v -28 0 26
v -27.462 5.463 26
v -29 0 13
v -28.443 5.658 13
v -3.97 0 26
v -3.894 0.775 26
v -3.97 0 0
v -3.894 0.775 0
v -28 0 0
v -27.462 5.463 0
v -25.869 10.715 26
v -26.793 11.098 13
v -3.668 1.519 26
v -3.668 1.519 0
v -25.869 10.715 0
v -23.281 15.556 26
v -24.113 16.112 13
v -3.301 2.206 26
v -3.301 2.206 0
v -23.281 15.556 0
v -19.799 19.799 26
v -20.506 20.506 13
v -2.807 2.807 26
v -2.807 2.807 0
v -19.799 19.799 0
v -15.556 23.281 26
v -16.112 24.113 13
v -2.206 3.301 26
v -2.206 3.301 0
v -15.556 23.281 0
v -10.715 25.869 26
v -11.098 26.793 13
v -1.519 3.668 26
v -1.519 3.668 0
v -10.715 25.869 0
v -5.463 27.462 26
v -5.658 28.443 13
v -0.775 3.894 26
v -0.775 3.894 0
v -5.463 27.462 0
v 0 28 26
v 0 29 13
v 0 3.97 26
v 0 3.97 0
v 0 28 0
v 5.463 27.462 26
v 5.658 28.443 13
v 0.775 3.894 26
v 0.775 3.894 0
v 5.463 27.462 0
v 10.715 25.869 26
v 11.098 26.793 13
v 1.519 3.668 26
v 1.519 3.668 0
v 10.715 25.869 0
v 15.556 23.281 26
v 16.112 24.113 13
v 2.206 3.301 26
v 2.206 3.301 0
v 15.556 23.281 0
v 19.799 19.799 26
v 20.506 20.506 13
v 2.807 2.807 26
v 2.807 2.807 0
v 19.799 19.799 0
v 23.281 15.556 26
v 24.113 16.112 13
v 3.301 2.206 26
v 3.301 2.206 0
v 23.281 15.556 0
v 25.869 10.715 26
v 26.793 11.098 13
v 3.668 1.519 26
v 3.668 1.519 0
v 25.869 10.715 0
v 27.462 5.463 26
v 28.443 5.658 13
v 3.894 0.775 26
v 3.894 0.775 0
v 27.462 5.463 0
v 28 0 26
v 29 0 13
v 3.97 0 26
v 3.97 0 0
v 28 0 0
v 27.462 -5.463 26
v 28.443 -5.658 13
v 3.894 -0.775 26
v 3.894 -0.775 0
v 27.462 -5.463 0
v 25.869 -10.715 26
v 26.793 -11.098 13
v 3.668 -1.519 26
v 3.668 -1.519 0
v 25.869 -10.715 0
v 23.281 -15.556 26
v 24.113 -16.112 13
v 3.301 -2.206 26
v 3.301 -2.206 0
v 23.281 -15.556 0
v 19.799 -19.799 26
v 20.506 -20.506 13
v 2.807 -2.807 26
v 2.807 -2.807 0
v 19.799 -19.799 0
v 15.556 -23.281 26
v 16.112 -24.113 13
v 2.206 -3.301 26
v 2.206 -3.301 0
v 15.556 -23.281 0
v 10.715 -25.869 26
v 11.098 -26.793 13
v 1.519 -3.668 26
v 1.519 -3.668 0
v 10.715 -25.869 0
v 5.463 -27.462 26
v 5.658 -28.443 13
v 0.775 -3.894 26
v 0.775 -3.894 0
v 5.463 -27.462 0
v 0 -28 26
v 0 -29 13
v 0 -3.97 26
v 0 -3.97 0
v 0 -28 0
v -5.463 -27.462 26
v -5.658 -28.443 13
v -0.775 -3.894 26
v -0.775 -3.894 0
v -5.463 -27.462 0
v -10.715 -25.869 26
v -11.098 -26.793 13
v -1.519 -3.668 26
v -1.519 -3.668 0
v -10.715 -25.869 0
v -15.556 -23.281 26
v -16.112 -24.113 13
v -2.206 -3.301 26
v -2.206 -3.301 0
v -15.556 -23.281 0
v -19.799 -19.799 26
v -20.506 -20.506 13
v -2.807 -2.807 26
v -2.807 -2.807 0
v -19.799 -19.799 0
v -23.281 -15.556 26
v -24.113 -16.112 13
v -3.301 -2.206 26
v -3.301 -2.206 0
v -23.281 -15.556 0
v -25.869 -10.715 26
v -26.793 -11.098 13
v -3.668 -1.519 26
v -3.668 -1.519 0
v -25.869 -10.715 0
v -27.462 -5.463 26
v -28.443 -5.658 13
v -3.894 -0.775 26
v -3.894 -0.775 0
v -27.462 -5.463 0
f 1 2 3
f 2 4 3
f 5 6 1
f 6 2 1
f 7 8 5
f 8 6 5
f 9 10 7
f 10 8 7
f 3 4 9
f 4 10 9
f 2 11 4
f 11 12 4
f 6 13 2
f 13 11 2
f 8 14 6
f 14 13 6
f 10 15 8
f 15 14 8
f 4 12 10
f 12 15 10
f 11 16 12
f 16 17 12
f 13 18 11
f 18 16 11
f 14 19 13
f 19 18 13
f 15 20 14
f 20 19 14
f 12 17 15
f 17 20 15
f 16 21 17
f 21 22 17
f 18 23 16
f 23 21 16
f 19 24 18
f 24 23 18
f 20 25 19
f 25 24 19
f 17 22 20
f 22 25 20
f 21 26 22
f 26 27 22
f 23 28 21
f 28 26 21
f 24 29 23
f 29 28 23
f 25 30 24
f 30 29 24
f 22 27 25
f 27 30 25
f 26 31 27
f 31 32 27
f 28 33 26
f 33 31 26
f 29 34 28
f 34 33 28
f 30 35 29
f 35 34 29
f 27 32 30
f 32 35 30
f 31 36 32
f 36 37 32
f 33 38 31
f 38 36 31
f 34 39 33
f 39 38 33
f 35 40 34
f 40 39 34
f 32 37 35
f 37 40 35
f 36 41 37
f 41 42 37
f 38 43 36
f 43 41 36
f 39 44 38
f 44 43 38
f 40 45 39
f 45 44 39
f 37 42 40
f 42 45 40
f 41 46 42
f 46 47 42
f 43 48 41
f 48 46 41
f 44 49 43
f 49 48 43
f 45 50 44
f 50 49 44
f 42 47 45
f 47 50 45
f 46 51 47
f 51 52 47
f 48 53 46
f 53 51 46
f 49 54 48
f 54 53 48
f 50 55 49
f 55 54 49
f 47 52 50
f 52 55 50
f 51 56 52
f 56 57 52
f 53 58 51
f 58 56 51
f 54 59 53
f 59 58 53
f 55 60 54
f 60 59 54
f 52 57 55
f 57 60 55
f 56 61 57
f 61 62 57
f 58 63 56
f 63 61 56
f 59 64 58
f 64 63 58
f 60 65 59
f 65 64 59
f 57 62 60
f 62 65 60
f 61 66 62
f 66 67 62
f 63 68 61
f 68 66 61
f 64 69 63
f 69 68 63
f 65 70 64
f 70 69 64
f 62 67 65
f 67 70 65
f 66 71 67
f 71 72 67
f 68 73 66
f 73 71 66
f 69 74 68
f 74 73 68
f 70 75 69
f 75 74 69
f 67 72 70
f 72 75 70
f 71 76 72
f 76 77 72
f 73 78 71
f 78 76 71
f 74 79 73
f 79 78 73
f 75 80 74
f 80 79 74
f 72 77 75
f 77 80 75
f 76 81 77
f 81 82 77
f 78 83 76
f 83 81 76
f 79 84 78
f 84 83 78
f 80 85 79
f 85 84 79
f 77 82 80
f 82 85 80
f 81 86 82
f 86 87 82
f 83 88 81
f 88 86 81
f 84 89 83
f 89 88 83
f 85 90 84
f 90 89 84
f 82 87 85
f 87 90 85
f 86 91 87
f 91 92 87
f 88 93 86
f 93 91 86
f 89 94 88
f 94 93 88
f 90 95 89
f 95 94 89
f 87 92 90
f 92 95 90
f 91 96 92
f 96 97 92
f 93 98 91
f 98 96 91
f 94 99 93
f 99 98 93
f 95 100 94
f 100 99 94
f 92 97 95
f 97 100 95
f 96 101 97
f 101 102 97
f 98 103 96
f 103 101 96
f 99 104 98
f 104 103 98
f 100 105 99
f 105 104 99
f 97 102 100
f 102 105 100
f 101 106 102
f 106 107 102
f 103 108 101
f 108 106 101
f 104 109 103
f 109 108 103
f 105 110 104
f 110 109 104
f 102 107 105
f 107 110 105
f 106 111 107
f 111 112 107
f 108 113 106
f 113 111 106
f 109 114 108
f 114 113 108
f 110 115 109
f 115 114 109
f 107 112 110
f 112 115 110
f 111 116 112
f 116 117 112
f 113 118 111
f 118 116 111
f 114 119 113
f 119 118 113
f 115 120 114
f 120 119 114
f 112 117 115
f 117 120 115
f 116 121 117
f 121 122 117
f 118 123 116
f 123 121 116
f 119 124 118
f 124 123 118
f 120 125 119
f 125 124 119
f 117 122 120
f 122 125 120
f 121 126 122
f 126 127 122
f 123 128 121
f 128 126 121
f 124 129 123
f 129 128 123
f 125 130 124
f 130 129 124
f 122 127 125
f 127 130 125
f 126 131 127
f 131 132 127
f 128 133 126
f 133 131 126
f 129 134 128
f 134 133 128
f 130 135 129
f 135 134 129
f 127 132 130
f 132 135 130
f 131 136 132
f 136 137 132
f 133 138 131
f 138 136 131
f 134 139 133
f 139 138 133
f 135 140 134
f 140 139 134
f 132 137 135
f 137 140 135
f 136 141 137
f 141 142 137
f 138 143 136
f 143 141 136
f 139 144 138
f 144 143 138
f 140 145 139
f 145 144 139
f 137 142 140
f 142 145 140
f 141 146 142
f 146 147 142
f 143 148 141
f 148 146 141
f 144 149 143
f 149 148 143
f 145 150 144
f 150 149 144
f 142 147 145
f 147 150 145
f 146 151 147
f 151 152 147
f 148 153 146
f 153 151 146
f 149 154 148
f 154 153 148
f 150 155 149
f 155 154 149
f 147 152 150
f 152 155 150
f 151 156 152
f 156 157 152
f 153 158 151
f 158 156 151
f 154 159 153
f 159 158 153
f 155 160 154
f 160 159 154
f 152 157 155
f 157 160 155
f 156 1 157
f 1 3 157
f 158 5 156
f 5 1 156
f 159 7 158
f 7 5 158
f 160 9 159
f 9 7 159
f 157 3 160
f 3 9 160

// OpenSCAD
$fn = 32;

// ----------------------------------------------------------------------
// Belt roller: 56 mm barrel, 26 mm wide, bore 7.94 mm
// ----------------------------------------------------------------------

// --- parameters (mm) ---
bore_d = 7.94;            // bore
barrel_d = 56;            // barrel diameter
roller_w = 26;            // roller width
crown = 1;                // crown height at mid width

roller_profile = [[3.97, 0], [28, 0], [29, 13], [28, 26], [3.97, 26]];

/* the profile stays clear of the axis, so the bore comes out of the revolve */
rotate_extrude() polygon(roller_profile);
